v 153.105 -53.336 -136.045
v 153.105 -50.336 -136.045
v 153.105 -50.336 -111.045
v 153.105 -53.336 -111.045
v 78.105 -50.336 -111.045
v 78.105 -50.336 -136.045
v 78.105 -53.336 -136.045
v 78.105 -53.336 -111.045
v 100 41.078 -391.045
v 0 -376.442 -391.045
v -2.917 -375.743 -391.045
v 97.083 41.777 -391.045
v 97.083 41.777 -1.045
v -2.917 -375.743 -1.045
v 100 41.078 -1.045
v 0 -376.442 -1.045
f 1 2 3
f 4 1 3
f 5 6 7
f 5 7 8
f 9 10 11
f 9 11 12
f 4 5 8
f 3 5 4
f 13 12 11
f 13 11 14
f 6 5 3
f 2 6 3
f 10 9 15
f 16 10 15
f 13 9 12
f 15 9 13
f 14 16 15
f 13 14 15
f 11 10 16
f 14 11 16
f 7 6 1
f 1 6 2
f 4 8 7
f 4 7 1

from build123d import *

# Parameters (mm, degrees)
SKETCH4_W           = 390
SKETCH4_H           = 429.328487758
BOSS_EXTRUDE1_DEPTH = 3
SKETCH7_W           = 75
SKETCH7_H           = 25
BOSS_EXTRUDE2_DEPTH = 3


with BuildPart() as part:
    # Sketch4 → Boss-Extrude1 (new body)
    with BuildSketch(Plane(origin=(85.269871504, -20.422942974, 0), x_dir=(0, 0, 1), z_dir=(-0.9724954479051267, 0.23292188347986365, 0))):
        with Locations((-196.0445183, -151.423605962)):
            Rectangle(SKETCH4_W, SKETCH4_H)
    extrude(amount=BOSS_EXTRUDE1_DEPTH)


with BuildPart() as body_2:
    # Sketch7 → Boss-Extrude2 (new body)
    with BuildSketch(Plane.XZ.offset(50.33628258)):
        with Locations((115.605342953, -123.5445183)):
            Rectangle(SKETCH7_W, SKETCH7_H)
    extrude(amount=BOSS_EXTRUDE2_DEPTH)


solid = Compound([part.part, body_2.part])
